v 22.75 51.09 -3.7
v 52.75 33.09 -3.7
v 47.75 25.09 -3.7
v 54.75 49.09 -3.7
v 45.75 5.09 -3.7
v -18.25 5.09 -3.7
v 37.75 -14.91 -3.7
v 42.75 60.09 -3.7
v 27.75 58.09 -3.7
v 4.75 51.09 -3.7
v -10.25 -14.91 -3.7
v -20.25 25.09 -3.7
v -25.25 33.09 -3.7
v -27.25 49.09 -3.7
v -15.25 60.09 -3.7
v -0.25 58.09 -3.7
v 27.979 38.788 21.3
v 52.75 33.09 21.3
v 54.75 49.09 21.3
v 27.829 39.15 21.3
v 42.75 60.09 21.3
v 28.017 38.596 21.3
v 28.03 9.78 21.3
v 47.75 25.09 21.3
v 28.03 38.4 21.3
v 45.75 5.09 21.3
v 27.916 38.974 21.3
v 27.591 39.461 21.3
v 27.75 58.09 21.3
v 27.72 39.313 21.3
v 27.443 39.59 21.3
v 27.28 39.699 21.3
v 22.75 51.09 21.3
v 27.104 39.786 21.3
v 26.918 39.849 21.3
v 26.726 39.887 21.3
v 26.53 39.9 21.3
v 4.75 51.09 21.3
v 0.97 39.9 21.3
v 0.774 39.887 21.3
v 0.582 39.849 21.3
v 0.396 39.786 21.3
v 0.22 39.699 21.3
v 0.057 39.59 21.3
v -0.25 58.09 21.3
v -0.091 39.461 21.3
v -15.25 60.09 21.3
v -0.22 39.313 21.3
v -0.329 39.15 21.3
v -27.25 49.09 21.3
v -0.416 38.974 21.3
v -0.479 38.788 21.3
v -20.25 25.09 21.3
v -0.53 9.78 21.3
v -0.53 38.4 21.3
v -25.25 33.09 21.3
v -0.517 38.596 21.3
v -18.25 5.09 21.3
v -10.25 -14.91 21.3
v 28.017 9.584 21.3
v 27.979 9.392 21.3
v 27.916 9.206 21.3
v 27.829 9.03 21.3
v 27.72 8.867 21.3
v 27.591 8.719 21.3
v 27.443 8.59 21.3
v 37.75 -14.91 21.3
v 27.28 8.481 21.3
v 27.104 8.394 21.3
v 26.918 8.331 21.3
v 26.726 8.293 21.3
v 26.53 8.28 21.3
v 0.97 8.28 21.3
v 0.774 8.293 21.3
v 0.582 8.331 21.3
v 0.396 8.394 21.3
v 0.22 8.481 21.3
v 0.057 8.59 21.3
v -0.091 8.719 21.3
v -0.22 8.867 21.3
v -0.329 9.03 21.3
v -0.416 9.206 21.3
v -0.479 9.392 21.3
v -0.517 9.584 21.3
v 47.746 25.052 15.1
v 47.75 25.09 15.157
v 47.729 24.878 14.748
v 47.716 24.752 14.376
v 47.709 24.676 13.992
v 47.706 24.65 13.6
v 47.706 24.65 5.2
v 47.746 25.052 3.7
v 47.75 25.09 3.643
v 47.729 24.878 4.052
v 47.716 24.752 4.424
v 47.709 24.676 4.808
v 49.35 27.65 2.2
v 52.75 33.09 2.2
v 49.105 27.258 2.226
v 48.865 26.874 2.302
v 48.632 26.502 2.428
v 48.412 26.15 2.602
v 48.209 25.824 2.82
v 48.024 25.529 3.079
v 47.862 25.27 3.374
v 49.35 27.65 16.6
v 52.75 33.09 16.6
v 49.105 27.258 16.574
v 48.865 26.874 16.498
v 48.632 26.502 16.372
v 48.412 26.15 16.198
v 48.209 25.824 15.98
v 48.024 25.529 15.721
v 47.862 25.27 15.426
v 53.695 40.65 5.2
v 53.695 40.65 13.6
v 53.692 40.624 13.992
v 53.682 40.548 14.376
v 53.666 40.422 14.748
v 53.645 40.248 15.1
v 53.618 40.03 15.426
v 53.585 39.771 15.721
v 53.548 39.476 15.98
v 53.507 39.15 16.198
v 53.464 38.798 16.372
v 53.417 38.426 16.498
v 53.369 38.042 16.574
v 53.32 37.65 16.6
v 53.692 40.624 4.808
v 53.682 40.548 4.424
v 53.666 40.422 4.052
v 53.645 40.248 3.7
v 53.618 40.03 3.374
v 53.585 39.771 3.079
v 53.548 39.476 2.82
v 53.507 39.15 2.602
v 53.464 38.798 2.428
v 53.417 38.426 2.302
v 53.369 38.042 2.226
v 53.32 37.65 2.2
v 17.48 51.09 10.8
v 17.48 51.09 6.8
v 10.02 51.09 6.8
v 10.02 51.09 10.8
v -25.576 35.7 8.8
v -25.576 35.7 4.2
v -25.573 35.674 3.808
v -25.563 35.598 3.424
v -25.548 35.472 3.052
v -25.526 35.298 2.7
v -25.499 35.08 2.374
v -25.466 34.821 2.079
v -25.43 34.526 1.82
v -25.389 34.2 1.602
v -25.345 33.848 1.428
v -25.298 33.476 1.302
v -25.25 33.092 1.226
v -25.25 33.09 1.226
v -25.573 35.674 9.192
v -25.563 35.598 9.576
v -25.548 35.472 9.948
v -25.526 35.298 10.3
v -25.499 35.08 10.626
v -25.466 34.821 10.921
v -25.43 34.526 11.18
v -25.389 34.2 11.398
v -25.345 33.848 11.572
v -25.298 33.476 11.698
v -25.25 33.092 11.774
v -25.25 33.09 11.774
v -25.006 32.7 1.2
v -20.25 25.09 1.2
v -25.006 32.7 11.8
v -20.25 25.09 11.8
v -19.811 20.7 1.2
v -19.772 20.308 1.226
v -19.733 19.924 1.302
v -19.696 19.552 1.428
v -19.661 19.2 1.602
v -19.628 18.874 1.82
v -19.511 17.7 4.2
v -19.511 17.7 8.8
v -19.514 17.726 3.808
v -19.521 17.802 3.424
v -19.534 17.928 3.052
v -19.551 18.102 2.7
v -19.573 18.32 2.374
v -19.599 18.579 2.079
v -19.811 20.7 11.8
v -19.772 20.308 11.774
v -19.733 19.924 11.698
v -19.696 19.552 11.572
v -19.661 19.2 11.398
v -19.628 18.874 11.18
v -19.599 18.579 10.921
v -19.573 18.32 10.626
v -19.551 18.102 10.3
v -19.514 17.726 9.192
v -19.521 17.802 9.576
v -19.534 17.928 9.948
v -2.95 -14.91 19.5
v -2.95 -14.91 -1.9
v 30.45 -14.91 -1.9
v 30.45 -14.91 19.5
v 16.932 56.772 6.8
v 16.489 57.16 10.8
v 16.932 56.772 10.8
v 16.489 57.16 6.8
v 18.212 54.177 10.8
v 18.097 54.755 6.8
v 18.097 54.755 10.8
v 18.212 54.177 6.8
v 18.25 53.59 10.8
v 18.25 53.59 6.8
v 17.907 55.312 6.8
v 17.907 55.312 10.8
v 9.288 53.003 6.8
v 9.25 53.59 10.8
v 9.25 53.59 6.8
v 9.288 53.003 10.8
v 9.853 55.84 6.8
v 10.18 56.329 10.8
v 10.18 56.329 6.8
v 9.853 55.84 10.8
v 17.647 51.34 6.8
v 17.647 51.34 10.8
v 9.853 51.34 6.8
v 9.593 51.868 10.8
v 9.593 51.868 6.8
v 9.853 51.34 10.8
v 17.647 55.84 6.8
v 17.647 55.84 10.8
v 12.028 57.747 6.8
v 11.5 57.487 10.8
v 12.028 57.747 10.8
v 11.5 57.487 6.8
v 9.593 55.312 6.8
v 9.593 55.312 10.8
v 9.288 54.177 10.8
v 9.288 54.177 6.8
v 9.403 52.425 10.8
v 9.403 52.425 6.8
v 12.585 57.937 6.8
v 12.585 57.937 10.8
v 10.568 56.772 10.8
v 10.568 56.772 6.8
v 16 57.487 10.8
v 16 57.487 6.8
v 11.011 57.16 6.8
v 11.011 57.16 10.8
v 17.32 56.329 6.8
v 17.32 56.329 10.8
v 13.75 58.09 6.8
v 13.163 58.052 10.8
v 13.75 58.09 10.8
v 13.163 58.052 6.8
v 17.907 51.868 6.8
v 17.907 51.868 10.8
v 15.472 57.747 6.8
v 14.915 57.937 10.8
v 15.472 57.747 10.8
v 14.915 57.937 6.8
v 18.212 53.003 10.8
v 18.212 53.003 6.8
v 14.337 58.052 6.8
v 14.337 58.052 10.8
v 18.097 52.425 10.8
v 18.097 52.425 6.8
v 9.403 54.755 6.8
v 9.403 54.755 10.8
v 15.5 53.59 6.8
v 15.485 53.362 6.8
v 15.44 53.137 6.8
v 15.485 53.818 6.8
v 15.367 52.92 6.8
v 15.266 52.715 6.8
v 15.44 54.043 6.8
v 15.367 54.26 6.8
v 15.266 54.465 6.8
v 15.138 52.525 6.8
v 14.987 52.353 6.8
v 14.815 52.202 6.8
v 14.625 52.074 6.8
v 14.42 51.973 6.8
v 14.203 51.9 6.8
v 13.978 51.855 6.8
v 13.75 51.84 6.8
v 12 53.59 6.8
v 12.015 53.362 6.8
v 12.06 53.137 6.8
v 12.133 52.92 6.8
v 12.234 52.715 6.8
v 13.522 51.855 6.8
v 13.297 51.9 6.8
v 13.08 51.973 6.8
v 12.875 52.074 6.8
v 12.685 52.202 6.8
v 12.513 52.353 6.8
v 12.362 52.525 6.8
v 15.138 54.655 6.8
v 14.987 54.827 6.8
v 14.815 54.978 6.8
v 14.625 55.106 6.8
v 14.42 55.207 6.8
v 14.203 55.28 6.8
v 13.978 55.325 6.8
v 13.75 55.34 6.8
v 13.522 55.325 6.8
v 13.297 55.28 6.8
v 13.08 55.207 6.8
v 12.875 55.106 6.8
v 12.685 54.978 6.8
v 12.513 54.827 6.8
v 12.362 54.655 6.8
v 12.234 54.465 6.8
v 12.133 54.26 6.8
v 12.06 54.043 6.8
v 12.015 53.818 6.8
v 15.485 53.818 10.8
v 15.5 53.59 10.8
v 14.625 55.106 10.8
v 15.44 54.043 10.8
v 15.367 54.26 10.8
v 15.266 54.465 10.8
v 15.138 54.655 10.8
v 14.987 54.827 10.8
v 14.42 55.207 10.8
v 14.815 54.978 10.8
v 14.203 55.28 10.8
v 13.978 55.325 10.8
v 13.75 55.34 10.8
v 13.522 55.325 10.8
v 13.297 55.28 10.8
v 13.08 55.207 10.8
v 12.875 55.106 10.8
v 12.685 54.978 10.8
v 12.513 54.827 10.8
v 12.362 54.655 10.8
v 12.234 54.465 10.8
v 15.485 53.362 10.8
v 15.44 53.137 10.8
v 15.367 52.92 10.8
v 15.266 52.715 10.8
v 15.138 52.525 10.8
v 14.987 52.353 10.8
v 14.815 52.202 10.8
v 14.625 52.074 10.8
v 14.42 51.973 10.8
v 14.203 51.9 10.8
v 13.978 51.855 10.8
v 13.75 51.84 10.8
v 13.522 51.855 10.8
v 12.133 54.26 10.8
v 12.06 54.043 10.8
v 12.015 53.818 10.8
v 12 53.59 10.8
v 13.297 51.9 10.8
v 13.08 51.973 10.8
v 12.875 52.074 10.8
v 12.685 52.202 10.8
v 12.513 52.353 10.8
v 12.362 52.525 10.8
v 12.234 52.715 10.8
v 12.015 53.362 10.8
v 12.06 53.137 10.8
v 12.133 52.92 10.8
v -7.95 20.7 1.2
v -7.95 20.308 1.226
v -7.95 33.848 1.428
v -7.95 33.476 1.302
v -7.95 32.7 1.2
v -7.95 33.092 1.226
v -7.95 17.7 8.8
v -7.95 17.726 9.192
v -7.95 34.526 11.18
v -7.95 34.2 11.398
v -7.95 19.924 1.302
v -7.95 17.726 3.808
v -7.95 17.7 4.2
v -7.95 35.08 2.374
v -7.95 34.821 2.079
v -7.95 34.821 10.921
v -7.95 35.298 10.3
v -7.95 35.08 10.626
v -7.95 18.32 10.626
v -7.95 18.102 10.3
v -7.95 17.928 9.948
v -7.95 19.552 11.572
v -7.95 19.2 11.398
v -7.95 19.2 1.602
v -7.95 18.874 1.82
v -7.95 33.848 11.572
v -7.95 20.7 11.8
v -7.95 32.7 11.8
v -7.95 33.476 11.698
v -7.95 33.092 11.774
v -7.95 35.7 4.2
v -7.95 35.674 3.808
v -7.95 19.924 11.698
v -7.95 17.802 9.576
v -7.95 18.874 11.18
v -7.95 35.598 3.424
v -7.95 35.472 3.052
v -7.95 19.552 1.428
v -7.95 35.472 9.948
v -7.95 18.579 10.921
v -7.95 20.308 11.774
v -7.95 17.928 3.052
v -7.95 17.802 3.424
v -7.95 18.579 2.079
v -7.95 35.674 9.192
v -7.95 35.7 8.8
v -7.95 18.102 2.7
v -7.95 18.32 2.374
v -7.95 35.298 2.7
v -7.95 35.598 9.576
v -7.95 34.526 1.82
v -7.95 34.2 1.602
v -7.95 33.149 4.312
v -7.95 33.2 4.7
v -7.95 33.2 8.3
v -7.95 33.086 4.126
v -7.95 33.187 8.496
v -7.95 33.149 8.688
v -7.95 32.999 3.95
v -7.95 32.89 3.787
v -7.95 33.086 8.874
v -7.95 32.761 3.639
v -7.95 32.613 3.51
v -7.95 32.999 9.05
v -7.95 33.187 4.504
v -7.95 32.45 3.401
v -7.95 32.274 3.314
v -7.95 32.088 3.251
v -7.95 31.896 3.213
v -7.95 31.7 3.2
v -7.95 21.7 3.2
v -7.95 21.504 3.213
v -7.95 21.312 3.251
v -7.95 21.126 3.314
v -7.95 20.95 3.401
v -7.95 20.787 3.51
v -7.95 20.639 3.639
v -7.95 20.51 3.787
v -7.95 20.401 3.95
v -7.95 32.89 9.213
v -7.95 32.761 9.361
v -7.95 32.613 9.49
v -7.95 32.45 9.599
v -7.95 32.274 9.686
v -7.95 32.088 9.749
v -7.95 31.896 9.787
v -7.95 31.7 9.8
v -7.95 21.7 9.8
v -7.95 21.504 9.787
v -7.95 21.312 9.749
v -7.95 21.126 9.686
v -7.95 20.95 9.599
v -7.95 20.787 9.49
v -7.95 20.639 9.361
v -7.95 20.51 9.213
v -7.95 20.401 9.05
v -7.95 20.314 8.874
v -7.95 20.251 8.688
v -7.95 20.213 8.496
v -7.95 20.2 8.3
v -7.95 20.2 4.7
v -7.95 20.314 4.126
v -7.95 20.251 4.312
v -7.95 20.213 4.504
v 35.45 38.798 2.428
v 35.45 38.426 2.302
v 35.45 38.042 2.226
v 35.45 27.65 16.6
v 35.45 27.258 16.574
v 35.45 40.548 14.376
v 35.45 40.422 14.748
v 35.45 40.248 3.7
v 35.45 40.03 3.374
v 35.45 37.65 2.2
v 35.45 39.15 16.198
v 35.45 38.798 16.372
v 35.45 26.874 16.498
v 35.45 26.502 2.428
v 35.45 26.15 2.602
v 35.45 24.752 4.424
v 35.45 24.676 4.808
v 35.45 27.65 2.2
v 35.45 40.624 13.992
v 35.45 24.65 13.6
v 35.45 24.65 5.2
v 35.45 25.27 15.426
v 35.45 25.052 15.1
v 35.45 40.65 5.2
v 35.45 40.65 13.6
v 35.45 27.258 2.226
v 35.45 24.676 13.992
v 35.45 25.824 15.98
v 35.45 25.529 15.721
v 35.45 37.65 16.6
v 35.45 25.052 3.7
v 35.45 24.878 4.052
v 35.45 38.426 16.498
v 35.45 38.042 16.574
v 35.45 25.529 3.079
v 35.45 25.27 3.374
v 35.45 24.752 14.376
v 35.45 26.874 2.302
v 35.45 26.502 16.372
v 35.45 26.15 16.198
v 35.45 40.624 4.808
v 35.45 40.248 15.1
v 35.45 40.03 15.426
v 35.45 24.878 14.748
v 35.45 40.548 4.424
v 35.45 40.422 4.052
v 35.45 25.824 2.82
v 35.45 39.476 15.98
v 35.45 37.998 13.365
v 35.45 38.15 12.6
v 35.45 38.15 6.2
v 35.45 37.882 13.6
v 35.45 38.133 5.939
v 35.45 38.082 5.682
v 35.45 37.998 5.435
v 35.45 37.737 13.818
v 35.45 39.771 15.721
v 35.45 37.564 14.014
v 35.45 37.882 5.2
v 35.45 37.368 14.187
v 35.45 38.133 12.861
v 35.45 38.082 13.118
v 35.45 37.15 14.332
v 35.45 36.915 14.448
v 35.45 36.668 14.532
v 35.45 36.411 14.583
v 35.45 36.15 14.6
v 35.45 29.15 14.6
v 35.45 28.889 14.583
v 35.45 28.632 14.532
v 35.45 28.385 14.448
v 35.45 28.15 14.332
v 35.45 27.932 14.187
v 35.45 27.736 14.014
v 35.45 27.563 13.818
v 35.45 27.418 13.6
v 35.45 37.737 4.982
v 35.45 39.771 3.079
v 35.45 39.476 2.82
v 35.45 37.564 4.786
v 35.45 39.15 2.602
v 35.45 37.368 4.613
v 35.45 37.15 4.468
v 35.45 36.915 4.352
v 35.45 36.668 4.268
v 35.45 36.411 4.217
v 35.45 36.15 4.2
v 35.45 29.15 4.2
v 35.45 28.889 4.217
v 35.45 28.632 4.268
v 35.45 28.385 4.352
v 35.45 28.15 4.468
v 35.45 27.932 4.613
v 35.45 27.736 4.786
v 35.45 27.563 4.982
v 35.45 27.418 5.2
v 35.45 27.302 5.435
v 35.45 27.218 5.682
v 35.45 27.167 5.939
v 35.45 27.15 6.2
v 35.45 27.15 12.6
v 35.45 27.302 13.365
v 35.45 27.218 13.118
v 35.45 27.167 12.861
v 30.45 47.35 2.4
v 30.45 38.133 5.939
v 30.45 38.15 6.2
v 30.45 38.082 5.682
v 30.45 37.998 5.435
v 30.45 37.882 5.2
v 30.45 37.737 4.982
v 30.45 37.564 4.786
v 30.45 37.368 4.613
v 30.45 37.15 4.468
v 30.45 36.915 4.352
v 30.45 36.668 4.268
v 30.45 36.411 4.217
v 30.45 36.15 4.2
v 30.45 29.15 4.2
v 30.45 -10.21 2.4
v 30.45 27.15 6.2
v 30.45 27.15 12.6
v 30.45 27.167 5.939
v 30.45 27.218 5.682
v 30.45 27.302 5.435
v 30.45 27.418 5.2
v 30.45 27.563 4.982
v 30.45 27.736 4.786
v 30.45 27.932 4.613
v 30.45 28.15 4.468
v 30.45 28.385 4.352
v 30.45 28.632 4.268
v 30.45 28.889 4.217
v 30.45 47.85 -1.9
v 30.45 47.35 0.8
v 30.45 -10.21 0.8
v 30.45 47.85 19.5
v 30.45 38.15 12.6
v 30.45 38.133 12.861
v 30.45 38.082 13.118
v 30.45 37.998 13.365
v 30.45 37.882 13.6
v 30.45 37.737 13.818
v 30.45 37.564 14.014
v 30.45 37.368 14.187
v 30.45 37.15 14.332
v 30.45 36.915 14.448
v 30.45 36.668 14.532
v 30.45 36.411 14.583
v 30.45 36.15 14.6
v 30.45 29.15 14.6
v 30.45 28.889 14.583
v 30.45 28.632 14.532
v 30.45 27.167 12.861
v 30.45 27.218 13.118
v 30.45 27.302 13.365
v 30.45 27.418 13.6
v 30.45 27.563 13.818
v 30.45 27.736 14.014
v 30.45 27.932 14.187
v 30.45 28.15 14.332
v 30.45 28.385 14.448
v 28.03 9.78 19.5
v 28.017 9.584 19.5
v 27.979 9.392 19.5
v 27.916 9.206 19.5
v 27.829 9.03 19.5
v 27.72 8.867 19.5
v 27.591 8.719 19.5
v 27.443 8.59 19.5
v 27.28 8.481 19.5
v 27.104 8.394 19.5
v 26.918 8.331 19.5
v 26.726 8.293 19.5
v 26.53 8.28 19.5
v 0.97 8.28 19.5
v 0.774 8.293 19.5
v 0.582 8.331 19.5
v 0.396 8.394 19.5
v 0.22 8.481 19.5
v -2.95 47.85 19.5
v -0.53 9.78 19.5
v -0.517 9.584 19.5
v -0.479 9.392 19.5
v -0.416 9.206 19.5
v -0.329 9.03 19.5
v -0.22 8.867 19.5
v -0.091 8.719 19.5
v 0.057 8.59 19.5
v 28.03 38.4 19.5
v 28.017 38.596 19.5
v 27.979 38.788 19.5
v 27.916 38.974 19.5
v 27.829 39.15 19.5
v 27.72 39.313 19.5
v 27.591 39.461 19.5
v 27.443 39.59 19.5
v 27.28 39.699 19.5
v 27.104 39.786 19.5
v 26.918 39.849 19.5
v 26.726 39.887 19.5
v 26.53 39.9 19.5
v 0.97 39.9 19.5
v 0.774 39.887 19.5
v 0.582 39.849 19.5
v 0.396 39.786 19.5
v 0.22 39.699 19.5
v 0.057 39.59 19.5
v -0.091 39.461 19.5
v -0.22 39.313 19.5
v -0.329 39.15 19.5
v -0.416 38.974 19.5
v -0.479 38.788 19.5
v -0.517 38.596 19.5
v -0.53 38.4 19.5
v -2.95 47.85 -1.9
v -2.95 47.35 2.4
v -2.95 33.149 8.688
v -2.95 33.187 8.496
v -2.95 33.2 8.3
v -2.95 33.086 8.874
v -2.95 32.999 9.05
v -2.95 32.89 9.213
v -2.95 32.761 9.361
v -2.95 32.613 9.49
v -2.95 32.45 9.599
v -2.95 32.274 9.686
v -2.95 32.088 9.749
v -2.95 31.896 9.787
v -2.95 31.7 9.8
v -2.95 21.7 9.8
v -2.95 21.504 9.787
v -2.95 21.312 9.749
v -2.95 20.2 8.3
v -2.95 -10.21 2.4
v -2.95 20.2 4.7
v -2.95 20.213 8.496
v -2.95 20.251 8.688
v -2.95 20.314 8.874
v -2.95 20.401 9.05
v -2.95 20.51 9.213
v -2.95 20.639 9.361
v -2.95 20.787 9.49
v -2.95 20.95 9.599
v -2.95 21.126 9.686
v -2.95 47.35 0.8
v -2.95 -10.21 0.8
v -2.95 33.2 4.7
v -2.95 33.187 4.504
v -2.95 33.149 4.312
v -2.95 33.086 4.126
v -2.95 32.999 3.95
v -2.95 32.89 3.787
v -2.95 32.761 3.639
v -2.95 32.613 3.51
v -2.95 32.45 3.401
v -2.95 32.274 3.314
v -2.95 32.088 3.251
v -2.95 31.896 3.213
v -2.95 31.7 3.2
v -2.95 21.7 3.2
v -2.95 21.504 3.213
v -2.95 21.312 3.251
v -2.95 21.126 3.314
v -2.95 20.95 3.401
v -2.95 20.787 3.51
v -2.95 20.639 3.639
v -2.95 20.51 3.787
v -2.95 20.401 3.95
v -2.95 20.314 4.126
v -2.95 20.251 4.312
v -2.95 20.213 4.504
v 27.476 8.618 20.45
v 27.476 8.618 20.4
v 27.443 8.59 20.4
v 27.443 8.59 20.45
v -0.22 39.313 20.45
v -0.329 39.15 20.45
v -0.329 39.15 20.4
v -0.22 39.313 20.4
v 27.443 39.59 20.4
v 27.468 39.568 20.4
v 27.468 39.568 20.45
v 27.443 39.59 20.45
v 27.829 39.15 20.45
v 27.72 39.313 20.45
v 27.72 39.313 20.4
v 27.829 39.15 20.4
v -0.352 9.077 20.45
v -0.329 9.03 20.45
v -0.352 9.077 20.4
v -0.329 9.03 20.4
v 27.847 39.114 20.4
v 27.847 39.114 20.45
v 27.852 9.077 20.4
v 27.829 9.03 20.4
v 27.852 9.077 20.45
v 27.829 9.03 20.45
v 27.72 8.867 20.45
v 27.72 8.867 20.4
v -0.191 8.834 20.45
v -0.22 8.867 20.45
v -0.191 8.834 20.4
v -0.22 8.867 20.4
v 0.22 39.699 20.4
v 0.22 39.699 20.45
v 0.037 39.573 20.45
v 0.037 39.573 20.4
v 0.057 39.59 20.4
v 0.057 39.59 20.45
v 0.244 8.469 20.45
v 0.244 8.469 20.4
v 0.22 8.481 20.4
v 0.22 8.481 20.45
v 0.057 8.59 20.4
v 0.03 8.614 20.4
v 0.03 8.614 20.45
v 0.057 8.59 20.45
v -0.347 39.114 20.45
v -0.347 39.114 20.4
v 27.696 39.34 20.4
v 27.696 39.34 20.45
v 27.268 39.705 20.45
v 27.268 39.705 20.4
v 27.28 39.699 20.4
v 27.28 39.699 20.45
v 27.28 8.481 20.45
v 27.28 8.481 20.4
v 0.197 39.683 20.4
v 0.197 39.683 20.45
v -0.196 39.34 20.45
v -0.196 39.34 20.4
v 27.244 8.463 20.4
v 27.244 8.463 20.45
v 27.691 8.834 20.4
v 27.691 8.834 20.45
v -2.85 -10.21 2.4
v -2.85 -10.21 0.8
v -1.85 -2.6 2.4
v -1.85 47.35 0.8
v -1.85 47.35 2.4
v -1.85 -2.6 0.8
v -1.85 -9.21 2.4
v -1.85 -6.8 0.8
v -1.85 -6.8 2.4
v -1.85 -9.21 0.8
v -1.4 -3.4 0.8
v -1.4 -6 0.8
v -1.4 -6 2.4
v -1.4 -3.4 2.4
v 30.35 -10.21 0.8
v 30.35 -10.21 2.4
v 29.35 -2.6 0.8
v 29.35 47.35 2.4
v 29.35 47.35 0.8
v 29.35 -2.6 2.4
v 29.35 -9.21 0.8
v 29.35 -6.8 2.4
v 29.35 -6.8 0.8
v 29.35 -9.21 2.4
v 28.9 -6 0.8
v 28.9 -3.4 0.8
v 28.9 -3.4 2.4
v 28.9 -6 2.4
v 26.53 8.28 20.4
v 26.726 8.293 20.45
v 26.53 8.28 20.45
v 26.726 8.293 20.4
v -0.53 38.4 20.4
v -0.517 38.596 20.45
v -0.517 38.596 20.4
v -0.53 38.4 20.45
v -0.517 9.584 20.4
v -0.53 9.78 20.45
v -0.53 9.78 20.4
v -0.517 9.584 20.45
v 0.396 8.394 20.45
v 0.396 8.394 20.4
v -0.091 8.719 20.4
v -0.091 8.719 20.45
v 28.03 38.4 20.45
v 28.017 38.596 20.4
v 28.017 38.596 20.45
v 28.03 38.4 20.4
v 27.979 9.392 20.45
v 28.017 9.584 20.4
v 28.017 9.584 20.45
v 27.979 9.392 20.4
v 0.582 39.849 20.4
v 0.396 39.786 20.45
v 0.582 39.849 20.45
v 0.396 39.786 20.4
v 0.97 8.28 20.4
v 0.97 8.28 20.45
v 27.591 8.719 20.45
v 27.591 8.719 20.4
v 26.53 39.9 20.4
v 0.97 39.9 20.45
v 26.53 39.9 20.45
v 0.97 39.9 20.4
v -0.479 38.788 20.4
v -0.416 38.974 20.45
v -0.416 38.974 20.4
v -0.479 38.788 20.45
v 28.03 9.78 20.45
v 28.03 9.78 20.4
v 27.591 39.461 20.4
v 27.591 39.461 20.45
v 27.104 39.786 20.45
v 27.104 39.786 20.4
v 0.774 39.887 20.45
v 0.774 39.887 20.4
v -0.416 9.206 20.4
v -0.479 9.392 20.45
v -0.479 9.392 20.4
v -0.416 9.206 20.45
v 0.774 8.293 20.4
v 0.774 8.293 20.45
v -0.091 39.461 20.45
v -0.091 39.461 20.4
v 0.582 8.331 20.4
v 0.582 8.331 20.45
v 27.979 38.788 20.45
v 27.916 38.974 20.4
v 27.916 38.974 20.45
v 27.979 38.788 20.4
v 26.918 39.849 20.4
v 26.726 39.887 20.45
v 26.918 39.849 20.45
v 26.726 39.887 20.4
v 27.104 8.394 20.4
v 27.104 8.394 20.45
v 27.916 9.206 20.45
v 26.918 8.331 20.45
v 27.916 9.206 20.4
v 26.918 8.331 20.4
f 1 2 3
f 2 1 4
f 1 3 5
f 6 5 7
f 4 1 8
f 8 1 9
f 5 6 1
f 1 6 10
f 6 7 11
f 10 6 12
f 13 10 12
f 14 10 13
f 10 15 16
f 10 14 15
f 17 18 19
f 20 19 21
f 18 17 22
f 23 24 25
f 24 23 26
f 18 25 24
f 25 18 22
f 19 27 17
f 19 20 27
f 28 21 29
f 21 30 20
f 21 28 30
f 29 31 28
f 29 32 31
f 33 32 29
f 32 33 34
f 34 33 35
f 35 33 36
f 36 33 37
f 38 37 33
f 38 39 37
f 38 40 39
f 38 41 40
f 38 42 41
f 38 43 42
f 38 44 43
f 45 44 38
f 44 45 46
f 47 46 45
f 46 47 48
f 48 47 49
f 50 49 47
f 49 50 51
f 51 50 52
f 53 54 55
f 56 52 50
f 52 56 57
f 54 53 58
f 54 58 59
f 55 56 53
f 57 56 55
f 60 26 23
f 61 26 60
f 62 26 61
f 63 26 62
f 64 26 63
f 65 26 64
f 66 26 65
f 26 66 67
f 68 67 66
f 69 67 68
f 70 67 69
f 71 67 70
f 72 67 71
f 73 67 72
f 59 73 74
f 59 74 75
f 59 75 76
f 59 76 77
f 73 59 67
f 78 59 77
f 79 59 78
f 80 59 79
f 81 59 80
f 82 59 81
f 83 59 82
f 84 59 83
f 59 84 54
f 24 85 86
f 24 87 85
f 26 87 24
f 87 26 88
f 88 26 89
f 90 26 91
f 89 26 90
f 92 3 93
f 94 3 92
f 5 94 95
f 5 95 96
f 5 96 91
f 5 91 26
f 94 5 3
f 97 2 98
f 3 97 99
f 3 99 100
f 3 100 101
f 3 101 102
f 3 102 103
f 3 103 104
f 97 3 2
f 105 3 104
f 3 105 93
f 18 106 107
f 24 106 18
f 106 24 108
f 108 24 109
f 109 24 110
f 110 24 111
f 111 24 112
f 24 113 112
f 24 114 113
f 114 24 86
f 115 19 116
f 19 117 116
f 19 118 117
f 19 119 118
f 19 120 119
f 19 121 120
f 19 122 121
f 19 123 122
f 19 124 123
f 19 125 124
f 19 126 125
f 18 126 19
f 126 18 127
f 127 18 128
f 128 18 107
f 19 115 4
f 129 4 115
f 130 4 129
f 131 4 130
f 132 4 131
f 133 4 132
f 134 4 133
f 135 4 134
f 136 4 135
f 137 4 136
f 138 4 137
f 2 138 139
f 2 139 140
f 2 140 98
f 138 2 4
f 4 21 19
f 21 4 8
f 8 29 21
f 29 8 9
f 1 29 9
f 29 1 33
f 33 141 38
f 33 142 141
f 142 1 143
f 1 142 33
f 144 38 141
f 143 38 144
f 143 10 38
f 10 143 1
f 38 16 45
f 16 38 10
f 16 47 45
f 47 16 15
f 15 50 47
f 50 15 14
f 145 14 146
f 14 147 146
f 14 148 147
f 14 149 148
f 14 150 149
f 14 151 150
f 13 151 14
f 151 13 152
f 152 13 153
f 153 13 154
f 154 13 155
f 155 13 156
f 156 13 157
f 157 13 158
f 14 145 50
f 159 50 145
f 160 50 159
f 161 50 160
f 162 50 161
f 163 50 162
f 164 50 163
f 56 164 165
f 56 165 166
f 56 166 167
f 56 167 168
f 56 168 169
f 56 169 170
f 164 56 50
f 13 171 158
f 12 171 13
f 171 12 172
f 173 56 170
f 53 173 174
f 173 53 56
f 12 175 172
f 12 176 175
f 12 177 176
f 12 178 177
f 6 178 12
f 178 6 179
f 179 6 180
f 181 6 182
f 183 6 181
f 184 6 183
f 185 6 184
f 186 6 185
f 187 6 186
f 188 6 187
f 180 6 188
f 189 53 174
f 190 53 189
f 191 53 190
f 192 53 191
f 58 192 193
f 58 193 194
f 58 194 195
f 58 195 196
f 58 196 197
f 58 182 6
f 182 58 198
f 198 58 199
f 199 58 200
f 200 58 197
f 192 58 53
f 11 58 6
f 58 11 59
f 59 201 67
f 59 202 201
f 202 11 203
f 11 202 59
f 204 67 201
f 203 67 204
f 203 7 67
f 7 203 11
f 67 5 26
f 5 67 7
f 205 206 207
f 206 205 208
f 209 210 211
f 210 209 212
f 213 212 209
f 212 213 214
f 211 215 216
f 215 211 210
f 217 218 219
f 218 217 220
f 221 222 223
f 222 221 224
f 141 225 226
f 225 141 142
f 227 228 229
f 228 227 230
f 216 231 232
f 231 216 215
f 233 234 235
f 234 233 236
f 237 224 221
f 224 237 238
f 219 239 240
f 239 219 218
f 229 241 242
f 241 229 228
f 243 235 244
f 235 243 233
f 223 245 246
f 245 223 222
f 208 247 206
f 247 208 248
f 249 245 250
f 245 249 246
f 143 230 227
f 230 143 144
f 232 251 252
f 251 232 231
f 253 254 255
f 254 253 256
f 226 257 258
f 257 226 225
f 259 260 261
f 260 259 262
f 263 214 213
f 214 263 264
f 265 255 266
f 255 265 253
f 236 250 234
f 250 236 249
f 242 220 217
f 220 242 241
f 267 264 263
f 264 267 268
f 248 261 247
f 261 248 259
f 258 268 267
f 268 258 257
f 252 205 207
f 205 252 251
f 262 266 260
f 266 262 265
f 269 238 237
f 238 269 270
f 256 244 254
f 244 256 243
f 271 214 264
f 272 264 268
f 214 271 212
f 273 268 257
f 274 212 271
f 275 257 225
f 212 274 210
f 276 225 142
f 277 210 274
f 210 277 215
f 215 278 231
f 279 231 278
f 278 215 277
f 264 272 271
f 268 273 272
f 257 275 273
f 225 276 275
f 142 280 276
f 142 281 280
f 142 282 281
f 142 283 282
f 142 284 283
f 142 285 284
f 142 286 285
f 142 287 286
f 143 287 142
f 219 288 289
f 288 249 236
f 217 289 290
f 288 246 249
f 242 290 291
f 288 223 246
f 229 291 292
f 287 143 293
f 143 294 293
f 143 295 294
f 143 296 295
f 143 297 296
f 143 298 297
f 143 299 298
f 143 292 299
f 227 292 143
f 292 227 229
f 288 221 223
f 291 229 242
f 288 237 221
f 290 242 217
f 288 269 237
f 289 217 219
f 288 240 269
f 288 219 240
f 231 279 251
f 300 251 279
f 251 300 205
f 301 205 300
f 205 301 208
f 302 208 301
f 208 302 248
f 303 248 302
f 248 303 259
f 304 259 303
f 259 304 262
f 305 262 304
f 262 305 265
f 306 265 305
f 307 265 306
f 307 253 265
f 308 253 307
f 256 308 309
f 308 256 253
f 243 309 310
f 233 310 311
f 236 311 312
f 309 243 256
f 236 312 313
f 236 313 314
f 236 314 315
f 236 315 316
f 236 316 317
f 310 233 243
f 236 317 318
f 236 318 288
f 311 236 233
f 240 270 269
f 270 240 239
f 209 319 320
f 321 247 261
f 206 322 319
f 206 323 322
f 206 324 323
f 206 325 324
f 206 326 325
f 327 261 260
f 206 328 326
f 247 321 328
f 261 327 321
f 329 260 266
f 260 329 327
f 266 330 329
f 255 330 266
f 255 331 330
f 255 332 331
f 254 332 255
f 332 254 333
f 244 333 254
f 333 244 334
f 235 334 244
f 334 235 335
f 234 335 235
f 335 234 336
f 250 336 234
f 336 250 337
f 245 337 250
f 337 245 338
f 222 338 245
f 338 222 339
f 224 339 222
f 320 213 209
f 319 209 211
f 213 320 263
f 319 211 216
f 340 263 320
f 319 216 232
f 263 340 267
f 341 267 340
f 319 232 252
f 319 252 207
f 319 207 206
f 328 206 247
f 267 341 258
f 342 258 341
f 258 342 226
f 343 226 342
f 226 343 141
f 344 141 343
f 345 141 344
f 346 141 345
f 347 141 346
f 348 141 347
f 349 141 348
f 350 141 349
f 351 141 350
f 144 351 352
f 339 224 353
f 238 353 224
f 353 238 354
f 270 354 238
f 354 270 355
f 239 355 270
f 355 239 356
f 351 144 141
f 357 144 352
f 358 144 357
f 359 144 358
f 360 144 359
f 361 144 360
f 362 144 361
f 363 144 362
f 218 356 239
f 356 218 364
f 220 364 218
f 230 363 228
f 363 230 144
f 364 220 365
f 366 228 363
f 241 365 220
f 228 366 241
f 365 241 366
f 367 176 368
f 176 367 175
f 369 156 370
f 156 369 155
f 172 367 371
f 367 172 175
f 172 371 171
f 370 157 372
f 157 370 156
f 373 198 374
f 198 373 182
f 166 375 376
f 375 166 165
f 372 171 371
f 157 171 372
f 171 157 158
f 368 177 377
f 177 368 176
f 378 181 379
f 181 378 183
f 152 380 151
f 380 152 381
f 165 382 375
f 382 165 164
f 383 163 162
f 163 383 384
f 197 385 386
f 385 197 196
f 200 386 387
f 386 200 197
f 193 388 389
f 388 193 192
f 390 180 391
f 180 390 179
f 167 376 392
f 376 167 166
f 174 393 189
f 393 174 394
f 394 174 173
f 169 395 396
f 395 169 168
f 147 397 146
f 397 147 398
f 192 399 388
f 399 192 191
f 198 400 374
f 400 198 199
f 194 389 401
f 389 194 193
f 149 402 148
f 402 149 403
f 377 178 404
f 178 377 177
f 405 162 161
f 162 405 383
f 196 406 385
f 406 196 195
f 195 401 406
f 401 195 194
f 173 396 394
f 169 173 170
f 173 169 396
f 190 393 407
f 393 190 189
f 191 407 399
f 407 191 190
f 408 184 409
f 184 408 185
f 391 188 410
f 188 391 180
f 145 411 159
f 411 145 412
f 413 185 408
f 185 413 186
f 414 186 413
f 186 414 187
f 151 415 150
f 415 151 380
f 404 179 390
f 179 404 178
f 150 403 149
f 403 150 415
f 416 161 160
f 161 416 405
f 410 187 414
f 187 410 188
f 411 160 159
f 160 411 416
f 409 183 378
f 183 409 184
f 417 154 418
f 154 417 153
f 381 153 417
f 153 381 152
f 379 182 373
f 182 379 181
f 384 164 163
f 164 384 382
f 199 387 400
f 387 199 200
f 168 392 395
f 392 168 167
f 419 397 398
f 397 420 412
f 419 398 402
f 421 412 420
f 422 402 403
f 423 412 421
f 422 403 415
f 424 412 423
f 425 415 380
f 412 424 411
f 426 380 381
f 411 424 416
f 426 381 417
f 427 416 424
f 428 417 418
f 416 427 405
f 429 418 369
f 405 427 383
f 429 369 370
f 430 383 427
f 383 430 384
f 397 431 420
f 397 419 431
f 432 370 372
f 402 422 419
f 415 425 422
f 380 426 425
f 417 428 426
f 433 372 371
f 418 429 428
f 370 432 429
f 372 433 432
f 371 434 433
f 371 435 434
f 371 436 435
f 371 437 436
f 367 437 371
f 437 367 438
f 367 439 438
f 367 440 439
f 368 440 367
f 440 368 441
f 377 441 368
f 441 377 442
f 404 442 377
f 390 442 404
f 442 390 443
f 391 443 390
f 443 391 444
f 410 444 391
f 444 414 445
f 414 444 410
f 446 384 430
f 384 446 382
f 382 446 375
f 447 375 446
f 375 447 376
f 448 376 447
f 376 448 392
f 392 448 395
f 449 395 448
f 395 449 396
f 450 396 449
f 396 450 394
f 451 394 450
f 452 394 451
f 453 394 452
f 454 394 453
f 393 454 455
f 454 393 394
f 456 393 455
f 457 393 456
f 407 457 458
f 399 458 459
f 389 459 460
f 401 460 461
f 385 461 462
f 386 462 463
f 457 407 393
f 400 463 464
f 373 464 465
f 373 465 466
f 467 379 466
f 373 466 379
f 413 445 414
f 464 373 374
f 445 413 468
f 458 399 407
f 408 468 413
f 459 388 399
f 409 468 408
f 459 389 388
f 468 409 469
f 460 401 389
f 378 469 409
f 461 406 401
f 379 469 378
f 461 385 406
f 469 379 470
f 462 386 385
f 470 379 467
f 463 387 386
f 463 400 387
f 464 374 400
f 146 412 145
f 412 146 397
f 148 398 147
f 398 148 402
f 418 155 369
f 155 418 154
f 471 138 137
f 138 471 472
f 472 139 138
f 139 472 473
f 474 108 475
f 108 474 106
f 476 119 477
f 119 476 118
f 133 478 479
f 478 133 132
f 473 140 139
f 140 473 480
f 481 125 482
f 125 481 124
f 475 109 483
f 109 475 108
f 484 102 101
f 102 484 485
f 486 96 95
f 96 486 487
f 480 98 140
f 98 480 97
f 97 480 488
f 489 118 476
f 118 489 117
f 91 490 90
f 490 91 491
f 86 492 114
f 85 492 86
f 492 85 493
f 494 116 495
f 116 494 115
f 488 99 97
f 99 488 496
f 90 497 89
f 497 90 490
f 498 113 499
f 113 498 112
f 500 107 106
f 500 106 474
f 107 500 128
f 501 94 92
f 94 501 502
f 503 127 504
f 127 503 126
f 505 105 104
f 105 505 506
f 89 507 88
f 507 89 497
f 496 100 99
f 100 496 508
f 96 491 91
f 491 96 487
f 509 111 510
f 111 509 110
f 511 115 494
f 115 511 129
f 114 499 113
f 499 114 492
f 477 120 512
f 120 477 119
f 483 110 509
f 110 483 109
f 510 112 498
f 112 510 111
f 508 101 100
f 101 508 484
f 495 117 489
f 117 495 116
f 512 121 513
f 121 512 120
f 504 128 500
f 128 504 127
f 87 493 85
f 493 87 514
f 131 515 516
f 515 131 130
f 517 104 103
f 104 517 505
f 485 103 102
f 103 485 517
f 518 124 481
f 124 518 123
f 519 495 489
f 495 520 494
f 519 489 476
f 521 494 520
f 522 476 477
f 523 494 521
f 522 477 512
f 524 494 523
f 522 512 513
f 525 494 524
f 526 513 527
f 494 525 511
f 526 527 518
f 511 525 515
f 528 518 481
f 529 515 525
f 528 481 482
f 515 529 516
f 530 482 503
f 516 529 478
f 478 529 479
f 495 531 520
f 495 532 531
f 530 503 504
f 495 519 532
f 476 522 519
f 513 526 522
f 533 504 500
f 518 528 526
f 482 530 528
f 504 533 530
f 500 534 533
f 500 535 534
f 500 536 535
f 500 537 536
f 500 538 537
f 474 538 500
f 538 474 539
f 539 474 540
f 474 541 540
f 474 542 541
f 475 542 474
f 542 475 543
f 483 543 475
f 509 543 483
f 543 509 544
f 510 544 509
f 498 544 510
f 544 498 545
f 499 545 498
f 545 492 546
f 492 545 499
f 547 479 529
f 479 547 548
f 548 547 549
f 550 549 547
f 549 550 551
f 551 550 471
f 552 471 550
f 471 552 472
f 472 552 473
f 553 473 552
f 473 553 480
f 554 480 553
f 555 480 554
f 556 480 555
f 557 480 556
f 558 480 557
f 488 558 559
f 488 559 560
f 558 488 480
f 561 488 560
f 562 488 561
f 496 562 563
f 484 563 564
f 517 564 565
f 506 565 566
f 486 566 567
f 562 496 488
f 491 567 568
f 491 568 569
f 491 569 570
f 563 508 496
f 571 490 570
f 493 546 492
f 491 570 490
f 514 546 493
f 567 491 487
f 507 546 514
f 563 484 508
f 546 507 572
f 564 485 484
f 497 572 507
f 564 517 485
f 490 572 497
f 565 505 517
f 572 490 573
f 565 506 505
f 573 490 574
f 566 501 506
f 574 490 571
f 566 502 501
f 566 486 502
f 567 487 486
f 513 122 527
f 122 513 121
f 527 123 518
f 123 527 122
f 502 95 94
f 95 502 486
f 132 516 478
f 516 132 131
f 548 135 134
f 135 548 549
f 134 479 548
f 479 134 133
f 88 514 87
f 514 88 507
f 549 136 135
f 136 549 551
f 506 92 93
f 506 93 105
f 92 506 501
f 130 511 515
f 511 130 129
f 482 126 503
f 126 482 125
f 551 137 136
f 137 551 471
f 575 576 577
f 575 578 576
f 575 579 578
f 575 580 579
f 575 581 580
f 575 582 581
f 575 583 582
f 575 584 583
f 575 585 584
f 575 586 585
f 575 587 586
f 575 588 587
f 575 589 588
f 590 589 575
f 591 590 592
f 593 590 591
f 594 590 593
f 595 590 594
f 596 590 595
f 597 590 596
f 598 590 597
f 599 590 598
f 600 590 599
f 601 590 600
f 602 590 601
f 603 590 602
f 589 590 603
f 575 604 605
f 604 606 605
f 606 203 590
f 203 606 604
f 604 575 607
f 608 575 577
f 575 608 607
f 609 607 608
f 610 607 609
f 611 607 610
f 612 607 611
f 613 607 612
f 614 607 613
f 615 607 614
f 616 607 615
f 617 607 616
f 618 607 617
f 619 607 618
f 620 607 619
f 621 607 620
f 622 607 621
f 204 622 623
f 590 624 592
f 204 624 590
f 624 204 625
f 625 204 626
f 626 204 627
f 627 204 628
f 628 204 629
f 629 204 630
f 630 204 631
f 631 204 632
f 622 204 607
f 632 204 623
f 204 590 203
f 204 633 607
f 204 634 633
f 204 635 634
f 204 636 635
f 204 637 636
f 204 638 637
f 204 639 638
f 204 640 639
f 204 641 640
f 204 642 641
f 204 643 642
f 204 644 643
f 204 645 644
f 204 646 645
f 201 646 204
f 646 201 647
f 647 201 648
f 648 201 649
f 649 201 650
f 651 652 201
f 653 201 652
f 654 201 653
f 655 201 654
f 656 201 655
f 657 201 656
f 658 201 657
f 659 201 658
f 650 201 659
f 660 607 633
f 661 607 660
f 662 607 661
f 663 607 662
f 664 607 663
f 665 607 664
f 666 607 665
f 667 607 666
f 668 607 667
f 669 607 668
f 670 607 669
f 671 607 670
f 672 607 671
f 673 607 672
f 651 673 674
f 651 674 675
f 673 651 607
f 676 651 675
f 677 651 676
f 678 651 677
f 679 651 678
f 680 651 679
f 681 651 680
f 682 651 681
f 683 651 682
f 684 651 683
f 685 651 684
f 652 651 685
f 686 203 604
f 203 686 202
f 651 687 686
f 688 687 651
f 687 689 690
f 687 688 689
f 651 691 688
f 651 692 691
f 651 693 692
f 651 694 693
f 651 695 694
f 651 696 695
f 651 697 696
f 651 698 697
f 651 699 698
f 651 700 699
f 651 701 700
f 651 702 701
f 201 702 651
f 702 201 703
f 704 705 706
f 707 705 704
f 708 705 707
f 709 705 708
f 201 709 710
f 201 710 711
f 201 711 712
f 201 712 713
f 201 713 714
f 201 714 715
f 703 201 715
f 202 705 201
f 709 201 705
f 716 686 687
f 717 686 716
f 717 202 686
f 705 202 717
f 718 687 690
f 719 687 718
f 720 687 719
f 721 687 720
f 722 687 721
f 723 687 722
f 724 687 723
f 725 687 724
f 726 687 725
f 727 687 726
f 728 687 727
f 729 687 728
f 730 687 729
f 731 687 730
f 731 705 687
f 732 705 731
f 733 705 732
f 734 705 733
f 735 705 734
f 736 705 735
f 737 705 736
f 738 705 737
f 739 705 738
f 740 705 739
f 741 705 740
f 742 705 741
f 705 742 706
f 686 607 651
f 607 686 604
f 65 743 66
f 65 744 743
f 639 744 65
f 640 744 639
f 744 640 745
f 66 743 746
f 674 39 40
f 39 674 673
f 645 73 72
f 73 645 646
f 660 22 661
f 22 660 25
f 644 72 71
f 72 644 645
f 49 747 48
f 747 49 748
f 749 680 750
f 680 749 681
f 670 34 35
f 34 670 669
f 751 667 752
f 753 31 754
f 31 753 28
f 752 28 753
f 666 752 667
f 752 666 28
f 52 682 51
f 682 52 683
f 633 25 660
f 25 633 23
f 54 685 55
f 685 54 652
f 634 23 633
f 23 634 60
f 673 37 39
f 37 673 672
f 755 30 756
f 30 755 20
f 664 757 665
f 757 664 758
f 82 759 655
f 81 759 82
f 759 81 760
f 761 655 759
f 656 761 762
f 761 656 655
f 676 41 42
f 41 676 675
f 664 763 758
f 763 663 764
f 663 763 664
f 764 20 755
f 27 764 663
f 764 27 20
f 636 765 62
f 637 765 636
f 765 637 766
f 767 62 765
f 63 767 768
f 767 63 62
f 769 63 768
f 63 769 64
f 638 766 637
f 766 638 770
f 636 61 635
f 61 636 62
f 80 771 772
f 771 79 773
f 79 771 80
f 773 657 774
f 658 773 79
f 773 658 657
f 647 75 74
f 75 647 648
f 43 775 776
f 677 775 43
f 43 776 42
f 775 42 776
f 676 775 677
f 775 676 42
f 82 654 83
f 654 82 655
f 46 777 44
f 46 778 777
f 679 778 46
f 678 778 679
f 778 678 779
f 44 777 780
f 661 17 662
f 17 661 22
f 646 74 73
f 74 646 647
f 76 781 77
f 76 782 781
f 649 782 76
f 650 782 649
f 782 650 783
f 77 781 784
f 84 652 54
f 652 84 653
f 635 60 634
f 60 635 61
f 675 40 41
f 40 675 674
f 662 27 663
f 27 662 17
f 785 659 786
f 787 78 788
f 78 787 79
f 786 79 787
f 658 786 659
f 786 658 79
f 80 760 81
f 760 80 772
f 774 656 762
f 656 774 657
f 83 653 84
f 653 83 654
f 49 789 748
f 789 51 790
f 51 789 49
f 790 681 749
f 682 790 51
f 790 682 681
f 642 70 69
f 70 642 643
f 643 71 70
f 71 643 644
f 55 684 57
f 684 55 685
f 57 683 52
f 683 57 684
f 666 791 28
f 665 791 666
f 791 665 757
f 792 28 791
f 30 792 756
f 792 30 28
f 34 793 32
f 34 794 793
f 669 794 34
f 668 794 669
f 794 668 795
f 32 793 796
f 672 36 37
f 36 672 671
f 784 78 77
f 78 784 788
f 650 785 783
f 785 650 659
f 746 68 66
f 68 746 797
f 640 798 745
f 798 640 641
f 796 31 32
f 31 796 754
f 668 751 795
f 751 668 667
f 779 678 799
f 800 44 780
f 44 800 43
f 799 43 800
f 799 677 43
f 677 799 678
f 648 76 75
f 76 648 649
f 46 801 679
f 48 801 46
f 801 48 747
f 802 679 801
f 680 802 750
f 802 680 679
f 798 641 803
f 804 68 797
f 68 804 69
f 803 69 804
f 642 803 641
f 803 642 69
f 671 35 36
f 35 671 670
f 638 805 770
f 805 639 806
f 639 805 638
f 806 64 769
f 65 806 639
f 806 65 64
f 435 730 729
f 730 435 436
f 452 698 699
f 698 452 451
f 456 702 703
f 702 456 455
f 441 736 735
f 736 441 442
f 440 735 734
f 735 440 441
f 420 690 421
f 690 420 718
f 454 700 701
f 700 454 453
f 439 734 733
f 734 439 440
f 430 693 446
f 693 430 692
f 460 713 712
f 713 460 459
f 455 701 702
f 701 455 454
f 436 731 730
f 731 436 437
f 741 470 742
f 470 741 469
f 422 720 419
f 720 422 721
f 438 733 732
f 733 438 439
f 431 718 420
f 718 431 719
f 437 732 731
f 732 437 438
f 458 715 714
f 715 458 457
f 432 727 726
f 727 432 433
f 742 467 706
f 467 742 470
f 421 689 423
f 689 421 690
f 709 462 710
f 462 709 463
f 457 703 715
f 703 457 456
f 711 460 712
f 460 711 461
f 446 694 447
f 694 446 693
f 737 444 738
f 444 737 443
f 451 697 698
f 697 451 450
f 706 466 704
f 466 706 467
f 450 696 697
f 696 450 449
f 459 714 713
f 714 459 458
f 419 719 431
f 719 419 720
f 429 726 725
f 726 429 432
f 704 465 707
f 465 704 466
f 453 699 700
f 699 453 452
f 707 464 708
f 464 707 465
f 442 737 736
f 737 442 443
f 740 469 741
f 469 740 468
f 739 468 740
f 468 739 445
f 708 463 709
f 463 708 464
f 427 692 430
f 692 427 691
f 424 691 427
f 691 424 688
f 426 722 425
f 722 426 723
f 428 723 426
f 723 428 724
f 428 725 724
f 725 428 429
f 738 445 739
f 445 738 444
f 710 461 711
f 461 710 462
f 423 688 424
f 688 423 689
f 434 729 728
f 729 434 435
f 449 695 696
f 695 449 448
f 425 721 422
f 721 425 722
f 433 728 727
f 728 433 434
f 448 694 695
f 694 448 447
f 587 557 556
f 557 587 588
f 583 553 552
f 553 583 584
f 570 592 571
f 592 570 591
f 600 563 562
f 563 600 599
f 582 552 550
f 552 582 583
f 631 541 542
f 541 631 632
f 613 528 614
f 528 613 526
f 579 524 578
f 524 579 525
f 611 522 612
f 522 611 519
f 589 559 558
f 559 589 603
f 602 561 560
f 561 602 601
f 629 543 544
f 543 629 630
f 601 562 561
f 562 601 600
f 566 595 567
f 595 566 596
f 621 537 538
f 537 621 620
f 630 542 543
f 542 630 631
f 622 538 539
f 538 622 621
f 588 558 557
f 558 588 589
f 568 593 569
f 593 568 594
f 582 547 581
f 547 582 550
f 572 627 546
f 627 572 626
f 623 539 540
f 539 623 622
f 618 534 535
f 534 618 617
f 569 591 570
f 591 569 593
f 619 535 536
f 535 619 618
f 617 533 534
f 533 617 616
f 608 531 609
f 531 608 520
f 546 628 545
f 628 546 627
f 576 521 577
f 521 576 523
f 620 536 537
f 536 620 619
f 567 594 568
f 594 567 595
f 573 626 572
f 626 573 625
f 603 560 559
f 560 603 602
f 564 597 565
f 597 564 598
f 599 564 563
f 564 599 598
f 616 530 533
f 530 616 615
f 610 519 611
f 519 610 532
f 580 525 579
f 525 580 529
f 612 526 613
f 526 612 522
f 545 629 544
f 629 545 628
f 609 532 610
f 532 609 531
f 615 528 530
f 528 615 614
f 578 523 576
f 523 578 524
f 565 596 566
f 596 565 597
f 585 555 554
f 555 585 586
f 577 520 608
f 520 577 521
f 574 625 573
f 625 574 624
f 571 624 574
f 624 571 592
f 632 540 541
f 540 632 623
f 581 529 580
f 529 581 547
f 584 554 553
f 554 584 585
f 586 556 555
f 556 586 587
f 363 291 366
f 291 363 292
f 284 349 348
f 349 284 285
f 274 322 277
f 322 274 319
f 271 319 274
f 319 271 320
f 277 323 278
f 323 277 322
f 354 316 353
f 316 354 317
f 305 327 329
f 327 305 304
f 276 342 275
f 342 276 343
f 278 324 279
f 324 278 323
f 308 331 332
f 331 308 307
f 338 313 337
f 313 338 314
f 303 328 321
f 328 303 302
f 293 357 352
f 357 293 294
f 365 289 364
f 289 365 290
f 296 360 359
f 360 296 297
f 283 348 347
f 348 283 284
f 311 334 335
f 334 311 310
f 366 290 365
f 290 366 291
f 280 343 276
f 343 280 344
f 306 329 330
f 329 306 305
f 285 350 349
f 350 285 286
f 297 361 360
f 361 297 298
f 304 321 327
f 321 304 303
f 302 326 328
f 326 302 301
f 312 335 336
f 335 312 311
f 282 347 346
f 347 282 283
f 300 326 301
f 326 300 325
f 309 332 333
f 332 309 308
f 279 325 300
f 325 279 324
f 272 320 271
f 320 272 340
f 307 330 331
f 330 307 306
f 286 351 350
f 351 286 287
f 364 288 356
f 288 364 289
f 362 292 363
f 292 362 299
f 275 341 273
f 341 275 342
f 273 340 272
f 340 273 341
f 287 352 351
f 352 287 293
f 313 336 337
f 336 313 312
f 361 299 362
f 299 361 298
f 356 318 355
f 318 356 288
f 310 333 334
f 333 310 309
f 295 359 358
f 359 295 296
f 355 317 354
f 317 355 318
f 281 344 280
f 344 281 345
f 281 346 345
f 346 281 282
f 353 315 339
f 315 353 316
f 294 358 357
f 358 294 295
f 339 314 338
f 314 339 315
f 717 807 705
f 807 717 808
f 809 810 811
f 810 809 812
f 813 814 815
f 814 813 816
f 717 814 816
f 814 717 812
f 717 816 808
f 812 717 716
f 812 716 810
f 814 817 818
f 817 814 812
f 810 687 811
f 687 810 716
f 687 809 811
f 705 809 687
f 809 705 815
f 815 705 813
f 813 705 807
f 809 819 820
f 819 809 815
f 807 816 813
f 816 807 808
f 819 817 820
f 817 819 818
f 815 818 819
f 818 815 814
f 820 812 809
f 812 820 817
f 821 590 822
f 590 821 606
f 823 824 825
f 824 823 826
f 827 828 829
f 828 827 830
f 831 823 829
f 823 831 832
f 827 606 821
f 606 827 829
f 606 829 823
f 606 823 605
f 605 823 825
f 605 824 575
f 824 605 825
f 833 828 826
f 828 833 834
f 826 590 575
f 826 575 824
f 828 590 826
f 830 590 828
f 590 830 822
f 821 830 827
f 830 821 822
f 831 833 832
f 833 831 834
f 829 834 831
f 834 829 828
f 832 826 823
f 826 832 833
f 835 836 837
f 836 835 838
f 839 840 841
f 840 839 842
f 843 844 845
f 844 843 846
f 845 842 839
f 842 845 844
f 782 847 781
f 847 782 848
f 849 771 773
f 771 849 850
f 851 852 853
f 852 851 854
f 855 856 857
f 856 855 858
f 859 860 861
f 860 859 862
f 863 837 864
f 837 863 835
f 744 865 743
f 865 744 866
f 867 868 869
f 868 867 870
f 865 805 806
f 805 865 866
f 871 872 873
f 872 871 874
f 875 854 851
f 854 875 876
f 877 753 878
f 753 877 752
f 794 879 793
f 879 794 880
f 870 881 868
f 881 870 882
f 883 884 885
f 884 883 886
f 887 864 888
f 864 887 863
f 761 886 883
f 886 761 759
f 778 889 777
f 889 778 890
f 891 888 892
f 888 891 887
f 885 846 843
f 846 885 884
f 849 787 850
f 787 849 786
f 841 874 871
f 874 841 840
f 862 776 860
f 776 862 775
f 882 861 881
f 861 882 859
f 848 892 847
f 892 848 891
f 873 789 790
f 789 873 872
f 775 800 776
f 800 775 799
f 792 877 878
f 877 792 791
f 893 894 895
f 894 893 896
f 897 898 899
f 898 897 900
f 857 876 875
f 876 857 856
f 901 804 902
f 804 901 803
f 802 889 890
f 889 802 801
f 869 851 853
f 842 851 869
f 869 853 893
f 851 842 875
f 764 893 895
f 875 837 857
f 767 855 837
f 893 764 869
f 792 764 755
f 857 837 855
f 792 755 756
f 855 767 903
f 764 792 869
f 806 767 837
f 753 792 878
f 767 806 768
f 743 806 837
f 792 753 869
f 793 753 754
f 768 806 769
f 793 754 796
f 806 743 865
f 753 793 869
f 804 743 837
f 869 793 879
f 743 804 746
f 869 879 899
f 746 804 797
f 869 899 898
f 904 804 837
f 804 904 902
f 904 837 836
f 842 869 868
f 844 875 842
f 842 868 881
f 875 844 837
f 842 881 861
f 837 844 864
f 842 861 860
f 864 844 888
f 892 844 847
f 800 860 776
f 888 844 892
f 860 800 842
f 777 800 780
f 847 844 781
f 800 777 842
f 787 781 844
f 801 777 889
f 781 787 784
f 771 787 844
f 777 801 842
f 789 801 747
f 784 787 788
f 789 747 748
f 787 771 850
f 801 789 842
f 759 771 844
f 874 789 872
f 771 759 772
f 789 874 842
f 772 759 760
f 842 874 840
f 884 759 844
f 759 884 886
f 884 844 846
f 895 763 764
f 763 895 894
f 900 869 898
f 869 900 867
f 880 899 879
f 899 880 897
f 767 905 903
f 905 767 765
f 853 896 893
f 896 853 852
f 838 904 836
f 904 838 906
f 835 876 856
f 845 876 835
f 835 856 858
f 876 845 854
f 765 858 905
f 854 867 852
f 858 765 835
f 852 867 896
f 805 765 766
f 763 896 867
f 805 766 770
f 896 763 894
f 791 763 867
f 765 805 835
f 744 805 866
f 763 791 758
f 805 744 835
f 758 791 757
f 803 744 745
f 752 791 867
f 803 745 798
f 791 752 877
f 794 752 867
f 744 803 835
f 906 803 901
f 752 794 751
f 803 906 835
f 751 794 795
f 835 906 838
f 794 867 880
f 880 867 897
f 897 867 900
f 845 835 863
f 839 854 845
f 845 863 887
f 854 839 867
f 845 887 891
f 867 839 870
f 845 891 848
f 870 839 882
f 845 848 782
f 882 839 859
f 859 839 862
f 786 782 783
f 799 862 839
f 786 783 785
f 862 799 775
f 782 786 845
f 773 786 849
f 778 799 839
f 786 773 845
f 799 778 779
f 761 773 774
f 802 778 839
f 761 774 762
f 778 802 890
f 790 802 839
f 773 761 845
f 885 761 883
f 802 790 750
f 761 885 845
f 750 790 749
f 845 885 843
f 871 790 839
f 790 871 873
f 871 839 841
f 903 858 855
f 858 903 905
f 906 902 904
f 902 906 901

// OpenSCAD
// file: xmas_orn_case.scad
// Forward archived designs to the unchanged shared core one directory above.
include <../xmas_orn_case.scad>
// main file
// Iron Man revision 5: restrained red chest armour and a circular arc-reactor bezel.
// No helmet; the existing rectangular display stays fully open inside the reactor ring.
// V1-V4 remain untouched. Mechanical interface comes from the common core.
// part: ironman_v5 | body/gold/black/white[_print] | check_core/colours/backing
include <xmas_orn_case.scad>
part = "ironman_v5";
preview_display = true;
im_cx = (glass_x0 + glass_x1)/2;
im_cy = (glass_y0 + glass_y1)/2 - 4;
im_bottom = -35;
im_top = 31; // hanging loop attaches inside the collar; shoulders reach y=40
im_inlay = 0.8;
im_names = ["body", "gold", "black", "white"];
im_colours = ["#ae2232", "#d9ae57", "#252a34", "#e9faff"];

module im_pair() { children(); mirror([1,0,0]) children(); }
module im_line(points,w=1.2) for (i=[0:len(points)-2]) hull() {
    translate(points[i]) circle(d=w,$fn=16);
    translate(points[i+1]) circle(d=w,$fn=16);
}
module im_window() translate([0,4]) offset(r = 1.5)
    square([glass_w+2*front_win_margin-3, glass_l+2*front_win_margin-3], center = true);
module im_outline() polygon([
    [-9,31],[9,31],[14,38],[29,40],[41,29],[39,13],[34,5],
    [32,-15],[24,-35],[-24,-35],[-32,-15],[-34,5],[-39,13],
    [-41,29],[-29,40],[-14,38]]);
module im_gold() im_pair() {
    // Small lateral armour inserts keep the chest predominantly red.
    polygon([[31,9],[34,13],[32,-13],[25,-28],[25,-20],[29,-10]]);
}
module im_black() {
    // Dark reactor housing: its round interior frames the rectangular display.
    translate([0,4]) circle(r=26.5,$fn=160);
    im_pair() {
        im_line([[12,29],[19,31],[29,33],[35,27]],1.1);
        im_line([[36,22],[35,16]],1.1);
    }
    // A single abdominal plate seam.
    im_line([[-19,-28],[-13,-25],[13,-25],[19,-28]],1.1);
}
module im_white() translate([0,4]) difference() {
    circle(r=24.5,$fn=160);
    circle(r=22.3,$fn=160);
}

module im_raw(c) {
    if (c == 1) im_gold();
    if (c == 2) im_black();
    if (c == 3) im_white();
}
module im_ink(c) difference() {
    intersection() { im_outline(); im_raw(c); }
    if (c < 3) for (k = [c+1:3]) im_raw(k);
}
module im_body() {
    difference() {
        union() {
            translate([im_cx,im_cy,sz0]) linear_extrude(sz1-sz0) im_outline();
            hang_loop(im_cx,im_cy+im_top);
        }
        hang_loop_hole(im_cx,im_cy+im_top);
        sleeve_cuts(ext = 40, finger = true);
        translate([im_cx,im_cy,sz1-im_inlay]) linear_extrude(im_inlay+eps)
            for (c = [1:3]) im_raw(c);
    }
    sleeve_rails();
}
module im_colour(c) difference() {
    translate([im_cx,im_cy,sz1-im_inlay]) linear_extrude(im_inlay) im_ink(c);
    sleeve_cuts(ext = 40, finger = true);
}
module im_piece(c) { if (c == 0) im_body(); else im_colour(c); }
module im_solid() union() for (c = [0:3]) im_piece(c);
module im_stand() translate([0,0,-(im_cy+im_bottom)]) rotate([90,0,0]) children();

if (part == "ironman_v5") {
    for (c = [0:3]) color(im_colours[c]) render() im_piece(c);
    if (preview_display) color("#101a25") translate([im_cx,im_cy,sz1-im_inlay-0.1])
        linear_extrude(0.05) im_window();
}
for (c = [0:3]) {
    if (part == im_names[c]) im_piece(c);
    if (part == str(im_names[c],"_print")) im_stand() im_piece(c);
}
if (part == "check_core") intersection() { im_solid(); union() { core_tray(); core_bezel(); } }
if (part == "check_colours") for (a = [0:2], b = [a+1:3])
    intersection() { im_piece(a); im_piece(b); }
if (part == "check_backing") difference() {
    translate([0,0,-im_inlay]) union() for (c = [1:3]) im_colour(c);
    im_body();
}
